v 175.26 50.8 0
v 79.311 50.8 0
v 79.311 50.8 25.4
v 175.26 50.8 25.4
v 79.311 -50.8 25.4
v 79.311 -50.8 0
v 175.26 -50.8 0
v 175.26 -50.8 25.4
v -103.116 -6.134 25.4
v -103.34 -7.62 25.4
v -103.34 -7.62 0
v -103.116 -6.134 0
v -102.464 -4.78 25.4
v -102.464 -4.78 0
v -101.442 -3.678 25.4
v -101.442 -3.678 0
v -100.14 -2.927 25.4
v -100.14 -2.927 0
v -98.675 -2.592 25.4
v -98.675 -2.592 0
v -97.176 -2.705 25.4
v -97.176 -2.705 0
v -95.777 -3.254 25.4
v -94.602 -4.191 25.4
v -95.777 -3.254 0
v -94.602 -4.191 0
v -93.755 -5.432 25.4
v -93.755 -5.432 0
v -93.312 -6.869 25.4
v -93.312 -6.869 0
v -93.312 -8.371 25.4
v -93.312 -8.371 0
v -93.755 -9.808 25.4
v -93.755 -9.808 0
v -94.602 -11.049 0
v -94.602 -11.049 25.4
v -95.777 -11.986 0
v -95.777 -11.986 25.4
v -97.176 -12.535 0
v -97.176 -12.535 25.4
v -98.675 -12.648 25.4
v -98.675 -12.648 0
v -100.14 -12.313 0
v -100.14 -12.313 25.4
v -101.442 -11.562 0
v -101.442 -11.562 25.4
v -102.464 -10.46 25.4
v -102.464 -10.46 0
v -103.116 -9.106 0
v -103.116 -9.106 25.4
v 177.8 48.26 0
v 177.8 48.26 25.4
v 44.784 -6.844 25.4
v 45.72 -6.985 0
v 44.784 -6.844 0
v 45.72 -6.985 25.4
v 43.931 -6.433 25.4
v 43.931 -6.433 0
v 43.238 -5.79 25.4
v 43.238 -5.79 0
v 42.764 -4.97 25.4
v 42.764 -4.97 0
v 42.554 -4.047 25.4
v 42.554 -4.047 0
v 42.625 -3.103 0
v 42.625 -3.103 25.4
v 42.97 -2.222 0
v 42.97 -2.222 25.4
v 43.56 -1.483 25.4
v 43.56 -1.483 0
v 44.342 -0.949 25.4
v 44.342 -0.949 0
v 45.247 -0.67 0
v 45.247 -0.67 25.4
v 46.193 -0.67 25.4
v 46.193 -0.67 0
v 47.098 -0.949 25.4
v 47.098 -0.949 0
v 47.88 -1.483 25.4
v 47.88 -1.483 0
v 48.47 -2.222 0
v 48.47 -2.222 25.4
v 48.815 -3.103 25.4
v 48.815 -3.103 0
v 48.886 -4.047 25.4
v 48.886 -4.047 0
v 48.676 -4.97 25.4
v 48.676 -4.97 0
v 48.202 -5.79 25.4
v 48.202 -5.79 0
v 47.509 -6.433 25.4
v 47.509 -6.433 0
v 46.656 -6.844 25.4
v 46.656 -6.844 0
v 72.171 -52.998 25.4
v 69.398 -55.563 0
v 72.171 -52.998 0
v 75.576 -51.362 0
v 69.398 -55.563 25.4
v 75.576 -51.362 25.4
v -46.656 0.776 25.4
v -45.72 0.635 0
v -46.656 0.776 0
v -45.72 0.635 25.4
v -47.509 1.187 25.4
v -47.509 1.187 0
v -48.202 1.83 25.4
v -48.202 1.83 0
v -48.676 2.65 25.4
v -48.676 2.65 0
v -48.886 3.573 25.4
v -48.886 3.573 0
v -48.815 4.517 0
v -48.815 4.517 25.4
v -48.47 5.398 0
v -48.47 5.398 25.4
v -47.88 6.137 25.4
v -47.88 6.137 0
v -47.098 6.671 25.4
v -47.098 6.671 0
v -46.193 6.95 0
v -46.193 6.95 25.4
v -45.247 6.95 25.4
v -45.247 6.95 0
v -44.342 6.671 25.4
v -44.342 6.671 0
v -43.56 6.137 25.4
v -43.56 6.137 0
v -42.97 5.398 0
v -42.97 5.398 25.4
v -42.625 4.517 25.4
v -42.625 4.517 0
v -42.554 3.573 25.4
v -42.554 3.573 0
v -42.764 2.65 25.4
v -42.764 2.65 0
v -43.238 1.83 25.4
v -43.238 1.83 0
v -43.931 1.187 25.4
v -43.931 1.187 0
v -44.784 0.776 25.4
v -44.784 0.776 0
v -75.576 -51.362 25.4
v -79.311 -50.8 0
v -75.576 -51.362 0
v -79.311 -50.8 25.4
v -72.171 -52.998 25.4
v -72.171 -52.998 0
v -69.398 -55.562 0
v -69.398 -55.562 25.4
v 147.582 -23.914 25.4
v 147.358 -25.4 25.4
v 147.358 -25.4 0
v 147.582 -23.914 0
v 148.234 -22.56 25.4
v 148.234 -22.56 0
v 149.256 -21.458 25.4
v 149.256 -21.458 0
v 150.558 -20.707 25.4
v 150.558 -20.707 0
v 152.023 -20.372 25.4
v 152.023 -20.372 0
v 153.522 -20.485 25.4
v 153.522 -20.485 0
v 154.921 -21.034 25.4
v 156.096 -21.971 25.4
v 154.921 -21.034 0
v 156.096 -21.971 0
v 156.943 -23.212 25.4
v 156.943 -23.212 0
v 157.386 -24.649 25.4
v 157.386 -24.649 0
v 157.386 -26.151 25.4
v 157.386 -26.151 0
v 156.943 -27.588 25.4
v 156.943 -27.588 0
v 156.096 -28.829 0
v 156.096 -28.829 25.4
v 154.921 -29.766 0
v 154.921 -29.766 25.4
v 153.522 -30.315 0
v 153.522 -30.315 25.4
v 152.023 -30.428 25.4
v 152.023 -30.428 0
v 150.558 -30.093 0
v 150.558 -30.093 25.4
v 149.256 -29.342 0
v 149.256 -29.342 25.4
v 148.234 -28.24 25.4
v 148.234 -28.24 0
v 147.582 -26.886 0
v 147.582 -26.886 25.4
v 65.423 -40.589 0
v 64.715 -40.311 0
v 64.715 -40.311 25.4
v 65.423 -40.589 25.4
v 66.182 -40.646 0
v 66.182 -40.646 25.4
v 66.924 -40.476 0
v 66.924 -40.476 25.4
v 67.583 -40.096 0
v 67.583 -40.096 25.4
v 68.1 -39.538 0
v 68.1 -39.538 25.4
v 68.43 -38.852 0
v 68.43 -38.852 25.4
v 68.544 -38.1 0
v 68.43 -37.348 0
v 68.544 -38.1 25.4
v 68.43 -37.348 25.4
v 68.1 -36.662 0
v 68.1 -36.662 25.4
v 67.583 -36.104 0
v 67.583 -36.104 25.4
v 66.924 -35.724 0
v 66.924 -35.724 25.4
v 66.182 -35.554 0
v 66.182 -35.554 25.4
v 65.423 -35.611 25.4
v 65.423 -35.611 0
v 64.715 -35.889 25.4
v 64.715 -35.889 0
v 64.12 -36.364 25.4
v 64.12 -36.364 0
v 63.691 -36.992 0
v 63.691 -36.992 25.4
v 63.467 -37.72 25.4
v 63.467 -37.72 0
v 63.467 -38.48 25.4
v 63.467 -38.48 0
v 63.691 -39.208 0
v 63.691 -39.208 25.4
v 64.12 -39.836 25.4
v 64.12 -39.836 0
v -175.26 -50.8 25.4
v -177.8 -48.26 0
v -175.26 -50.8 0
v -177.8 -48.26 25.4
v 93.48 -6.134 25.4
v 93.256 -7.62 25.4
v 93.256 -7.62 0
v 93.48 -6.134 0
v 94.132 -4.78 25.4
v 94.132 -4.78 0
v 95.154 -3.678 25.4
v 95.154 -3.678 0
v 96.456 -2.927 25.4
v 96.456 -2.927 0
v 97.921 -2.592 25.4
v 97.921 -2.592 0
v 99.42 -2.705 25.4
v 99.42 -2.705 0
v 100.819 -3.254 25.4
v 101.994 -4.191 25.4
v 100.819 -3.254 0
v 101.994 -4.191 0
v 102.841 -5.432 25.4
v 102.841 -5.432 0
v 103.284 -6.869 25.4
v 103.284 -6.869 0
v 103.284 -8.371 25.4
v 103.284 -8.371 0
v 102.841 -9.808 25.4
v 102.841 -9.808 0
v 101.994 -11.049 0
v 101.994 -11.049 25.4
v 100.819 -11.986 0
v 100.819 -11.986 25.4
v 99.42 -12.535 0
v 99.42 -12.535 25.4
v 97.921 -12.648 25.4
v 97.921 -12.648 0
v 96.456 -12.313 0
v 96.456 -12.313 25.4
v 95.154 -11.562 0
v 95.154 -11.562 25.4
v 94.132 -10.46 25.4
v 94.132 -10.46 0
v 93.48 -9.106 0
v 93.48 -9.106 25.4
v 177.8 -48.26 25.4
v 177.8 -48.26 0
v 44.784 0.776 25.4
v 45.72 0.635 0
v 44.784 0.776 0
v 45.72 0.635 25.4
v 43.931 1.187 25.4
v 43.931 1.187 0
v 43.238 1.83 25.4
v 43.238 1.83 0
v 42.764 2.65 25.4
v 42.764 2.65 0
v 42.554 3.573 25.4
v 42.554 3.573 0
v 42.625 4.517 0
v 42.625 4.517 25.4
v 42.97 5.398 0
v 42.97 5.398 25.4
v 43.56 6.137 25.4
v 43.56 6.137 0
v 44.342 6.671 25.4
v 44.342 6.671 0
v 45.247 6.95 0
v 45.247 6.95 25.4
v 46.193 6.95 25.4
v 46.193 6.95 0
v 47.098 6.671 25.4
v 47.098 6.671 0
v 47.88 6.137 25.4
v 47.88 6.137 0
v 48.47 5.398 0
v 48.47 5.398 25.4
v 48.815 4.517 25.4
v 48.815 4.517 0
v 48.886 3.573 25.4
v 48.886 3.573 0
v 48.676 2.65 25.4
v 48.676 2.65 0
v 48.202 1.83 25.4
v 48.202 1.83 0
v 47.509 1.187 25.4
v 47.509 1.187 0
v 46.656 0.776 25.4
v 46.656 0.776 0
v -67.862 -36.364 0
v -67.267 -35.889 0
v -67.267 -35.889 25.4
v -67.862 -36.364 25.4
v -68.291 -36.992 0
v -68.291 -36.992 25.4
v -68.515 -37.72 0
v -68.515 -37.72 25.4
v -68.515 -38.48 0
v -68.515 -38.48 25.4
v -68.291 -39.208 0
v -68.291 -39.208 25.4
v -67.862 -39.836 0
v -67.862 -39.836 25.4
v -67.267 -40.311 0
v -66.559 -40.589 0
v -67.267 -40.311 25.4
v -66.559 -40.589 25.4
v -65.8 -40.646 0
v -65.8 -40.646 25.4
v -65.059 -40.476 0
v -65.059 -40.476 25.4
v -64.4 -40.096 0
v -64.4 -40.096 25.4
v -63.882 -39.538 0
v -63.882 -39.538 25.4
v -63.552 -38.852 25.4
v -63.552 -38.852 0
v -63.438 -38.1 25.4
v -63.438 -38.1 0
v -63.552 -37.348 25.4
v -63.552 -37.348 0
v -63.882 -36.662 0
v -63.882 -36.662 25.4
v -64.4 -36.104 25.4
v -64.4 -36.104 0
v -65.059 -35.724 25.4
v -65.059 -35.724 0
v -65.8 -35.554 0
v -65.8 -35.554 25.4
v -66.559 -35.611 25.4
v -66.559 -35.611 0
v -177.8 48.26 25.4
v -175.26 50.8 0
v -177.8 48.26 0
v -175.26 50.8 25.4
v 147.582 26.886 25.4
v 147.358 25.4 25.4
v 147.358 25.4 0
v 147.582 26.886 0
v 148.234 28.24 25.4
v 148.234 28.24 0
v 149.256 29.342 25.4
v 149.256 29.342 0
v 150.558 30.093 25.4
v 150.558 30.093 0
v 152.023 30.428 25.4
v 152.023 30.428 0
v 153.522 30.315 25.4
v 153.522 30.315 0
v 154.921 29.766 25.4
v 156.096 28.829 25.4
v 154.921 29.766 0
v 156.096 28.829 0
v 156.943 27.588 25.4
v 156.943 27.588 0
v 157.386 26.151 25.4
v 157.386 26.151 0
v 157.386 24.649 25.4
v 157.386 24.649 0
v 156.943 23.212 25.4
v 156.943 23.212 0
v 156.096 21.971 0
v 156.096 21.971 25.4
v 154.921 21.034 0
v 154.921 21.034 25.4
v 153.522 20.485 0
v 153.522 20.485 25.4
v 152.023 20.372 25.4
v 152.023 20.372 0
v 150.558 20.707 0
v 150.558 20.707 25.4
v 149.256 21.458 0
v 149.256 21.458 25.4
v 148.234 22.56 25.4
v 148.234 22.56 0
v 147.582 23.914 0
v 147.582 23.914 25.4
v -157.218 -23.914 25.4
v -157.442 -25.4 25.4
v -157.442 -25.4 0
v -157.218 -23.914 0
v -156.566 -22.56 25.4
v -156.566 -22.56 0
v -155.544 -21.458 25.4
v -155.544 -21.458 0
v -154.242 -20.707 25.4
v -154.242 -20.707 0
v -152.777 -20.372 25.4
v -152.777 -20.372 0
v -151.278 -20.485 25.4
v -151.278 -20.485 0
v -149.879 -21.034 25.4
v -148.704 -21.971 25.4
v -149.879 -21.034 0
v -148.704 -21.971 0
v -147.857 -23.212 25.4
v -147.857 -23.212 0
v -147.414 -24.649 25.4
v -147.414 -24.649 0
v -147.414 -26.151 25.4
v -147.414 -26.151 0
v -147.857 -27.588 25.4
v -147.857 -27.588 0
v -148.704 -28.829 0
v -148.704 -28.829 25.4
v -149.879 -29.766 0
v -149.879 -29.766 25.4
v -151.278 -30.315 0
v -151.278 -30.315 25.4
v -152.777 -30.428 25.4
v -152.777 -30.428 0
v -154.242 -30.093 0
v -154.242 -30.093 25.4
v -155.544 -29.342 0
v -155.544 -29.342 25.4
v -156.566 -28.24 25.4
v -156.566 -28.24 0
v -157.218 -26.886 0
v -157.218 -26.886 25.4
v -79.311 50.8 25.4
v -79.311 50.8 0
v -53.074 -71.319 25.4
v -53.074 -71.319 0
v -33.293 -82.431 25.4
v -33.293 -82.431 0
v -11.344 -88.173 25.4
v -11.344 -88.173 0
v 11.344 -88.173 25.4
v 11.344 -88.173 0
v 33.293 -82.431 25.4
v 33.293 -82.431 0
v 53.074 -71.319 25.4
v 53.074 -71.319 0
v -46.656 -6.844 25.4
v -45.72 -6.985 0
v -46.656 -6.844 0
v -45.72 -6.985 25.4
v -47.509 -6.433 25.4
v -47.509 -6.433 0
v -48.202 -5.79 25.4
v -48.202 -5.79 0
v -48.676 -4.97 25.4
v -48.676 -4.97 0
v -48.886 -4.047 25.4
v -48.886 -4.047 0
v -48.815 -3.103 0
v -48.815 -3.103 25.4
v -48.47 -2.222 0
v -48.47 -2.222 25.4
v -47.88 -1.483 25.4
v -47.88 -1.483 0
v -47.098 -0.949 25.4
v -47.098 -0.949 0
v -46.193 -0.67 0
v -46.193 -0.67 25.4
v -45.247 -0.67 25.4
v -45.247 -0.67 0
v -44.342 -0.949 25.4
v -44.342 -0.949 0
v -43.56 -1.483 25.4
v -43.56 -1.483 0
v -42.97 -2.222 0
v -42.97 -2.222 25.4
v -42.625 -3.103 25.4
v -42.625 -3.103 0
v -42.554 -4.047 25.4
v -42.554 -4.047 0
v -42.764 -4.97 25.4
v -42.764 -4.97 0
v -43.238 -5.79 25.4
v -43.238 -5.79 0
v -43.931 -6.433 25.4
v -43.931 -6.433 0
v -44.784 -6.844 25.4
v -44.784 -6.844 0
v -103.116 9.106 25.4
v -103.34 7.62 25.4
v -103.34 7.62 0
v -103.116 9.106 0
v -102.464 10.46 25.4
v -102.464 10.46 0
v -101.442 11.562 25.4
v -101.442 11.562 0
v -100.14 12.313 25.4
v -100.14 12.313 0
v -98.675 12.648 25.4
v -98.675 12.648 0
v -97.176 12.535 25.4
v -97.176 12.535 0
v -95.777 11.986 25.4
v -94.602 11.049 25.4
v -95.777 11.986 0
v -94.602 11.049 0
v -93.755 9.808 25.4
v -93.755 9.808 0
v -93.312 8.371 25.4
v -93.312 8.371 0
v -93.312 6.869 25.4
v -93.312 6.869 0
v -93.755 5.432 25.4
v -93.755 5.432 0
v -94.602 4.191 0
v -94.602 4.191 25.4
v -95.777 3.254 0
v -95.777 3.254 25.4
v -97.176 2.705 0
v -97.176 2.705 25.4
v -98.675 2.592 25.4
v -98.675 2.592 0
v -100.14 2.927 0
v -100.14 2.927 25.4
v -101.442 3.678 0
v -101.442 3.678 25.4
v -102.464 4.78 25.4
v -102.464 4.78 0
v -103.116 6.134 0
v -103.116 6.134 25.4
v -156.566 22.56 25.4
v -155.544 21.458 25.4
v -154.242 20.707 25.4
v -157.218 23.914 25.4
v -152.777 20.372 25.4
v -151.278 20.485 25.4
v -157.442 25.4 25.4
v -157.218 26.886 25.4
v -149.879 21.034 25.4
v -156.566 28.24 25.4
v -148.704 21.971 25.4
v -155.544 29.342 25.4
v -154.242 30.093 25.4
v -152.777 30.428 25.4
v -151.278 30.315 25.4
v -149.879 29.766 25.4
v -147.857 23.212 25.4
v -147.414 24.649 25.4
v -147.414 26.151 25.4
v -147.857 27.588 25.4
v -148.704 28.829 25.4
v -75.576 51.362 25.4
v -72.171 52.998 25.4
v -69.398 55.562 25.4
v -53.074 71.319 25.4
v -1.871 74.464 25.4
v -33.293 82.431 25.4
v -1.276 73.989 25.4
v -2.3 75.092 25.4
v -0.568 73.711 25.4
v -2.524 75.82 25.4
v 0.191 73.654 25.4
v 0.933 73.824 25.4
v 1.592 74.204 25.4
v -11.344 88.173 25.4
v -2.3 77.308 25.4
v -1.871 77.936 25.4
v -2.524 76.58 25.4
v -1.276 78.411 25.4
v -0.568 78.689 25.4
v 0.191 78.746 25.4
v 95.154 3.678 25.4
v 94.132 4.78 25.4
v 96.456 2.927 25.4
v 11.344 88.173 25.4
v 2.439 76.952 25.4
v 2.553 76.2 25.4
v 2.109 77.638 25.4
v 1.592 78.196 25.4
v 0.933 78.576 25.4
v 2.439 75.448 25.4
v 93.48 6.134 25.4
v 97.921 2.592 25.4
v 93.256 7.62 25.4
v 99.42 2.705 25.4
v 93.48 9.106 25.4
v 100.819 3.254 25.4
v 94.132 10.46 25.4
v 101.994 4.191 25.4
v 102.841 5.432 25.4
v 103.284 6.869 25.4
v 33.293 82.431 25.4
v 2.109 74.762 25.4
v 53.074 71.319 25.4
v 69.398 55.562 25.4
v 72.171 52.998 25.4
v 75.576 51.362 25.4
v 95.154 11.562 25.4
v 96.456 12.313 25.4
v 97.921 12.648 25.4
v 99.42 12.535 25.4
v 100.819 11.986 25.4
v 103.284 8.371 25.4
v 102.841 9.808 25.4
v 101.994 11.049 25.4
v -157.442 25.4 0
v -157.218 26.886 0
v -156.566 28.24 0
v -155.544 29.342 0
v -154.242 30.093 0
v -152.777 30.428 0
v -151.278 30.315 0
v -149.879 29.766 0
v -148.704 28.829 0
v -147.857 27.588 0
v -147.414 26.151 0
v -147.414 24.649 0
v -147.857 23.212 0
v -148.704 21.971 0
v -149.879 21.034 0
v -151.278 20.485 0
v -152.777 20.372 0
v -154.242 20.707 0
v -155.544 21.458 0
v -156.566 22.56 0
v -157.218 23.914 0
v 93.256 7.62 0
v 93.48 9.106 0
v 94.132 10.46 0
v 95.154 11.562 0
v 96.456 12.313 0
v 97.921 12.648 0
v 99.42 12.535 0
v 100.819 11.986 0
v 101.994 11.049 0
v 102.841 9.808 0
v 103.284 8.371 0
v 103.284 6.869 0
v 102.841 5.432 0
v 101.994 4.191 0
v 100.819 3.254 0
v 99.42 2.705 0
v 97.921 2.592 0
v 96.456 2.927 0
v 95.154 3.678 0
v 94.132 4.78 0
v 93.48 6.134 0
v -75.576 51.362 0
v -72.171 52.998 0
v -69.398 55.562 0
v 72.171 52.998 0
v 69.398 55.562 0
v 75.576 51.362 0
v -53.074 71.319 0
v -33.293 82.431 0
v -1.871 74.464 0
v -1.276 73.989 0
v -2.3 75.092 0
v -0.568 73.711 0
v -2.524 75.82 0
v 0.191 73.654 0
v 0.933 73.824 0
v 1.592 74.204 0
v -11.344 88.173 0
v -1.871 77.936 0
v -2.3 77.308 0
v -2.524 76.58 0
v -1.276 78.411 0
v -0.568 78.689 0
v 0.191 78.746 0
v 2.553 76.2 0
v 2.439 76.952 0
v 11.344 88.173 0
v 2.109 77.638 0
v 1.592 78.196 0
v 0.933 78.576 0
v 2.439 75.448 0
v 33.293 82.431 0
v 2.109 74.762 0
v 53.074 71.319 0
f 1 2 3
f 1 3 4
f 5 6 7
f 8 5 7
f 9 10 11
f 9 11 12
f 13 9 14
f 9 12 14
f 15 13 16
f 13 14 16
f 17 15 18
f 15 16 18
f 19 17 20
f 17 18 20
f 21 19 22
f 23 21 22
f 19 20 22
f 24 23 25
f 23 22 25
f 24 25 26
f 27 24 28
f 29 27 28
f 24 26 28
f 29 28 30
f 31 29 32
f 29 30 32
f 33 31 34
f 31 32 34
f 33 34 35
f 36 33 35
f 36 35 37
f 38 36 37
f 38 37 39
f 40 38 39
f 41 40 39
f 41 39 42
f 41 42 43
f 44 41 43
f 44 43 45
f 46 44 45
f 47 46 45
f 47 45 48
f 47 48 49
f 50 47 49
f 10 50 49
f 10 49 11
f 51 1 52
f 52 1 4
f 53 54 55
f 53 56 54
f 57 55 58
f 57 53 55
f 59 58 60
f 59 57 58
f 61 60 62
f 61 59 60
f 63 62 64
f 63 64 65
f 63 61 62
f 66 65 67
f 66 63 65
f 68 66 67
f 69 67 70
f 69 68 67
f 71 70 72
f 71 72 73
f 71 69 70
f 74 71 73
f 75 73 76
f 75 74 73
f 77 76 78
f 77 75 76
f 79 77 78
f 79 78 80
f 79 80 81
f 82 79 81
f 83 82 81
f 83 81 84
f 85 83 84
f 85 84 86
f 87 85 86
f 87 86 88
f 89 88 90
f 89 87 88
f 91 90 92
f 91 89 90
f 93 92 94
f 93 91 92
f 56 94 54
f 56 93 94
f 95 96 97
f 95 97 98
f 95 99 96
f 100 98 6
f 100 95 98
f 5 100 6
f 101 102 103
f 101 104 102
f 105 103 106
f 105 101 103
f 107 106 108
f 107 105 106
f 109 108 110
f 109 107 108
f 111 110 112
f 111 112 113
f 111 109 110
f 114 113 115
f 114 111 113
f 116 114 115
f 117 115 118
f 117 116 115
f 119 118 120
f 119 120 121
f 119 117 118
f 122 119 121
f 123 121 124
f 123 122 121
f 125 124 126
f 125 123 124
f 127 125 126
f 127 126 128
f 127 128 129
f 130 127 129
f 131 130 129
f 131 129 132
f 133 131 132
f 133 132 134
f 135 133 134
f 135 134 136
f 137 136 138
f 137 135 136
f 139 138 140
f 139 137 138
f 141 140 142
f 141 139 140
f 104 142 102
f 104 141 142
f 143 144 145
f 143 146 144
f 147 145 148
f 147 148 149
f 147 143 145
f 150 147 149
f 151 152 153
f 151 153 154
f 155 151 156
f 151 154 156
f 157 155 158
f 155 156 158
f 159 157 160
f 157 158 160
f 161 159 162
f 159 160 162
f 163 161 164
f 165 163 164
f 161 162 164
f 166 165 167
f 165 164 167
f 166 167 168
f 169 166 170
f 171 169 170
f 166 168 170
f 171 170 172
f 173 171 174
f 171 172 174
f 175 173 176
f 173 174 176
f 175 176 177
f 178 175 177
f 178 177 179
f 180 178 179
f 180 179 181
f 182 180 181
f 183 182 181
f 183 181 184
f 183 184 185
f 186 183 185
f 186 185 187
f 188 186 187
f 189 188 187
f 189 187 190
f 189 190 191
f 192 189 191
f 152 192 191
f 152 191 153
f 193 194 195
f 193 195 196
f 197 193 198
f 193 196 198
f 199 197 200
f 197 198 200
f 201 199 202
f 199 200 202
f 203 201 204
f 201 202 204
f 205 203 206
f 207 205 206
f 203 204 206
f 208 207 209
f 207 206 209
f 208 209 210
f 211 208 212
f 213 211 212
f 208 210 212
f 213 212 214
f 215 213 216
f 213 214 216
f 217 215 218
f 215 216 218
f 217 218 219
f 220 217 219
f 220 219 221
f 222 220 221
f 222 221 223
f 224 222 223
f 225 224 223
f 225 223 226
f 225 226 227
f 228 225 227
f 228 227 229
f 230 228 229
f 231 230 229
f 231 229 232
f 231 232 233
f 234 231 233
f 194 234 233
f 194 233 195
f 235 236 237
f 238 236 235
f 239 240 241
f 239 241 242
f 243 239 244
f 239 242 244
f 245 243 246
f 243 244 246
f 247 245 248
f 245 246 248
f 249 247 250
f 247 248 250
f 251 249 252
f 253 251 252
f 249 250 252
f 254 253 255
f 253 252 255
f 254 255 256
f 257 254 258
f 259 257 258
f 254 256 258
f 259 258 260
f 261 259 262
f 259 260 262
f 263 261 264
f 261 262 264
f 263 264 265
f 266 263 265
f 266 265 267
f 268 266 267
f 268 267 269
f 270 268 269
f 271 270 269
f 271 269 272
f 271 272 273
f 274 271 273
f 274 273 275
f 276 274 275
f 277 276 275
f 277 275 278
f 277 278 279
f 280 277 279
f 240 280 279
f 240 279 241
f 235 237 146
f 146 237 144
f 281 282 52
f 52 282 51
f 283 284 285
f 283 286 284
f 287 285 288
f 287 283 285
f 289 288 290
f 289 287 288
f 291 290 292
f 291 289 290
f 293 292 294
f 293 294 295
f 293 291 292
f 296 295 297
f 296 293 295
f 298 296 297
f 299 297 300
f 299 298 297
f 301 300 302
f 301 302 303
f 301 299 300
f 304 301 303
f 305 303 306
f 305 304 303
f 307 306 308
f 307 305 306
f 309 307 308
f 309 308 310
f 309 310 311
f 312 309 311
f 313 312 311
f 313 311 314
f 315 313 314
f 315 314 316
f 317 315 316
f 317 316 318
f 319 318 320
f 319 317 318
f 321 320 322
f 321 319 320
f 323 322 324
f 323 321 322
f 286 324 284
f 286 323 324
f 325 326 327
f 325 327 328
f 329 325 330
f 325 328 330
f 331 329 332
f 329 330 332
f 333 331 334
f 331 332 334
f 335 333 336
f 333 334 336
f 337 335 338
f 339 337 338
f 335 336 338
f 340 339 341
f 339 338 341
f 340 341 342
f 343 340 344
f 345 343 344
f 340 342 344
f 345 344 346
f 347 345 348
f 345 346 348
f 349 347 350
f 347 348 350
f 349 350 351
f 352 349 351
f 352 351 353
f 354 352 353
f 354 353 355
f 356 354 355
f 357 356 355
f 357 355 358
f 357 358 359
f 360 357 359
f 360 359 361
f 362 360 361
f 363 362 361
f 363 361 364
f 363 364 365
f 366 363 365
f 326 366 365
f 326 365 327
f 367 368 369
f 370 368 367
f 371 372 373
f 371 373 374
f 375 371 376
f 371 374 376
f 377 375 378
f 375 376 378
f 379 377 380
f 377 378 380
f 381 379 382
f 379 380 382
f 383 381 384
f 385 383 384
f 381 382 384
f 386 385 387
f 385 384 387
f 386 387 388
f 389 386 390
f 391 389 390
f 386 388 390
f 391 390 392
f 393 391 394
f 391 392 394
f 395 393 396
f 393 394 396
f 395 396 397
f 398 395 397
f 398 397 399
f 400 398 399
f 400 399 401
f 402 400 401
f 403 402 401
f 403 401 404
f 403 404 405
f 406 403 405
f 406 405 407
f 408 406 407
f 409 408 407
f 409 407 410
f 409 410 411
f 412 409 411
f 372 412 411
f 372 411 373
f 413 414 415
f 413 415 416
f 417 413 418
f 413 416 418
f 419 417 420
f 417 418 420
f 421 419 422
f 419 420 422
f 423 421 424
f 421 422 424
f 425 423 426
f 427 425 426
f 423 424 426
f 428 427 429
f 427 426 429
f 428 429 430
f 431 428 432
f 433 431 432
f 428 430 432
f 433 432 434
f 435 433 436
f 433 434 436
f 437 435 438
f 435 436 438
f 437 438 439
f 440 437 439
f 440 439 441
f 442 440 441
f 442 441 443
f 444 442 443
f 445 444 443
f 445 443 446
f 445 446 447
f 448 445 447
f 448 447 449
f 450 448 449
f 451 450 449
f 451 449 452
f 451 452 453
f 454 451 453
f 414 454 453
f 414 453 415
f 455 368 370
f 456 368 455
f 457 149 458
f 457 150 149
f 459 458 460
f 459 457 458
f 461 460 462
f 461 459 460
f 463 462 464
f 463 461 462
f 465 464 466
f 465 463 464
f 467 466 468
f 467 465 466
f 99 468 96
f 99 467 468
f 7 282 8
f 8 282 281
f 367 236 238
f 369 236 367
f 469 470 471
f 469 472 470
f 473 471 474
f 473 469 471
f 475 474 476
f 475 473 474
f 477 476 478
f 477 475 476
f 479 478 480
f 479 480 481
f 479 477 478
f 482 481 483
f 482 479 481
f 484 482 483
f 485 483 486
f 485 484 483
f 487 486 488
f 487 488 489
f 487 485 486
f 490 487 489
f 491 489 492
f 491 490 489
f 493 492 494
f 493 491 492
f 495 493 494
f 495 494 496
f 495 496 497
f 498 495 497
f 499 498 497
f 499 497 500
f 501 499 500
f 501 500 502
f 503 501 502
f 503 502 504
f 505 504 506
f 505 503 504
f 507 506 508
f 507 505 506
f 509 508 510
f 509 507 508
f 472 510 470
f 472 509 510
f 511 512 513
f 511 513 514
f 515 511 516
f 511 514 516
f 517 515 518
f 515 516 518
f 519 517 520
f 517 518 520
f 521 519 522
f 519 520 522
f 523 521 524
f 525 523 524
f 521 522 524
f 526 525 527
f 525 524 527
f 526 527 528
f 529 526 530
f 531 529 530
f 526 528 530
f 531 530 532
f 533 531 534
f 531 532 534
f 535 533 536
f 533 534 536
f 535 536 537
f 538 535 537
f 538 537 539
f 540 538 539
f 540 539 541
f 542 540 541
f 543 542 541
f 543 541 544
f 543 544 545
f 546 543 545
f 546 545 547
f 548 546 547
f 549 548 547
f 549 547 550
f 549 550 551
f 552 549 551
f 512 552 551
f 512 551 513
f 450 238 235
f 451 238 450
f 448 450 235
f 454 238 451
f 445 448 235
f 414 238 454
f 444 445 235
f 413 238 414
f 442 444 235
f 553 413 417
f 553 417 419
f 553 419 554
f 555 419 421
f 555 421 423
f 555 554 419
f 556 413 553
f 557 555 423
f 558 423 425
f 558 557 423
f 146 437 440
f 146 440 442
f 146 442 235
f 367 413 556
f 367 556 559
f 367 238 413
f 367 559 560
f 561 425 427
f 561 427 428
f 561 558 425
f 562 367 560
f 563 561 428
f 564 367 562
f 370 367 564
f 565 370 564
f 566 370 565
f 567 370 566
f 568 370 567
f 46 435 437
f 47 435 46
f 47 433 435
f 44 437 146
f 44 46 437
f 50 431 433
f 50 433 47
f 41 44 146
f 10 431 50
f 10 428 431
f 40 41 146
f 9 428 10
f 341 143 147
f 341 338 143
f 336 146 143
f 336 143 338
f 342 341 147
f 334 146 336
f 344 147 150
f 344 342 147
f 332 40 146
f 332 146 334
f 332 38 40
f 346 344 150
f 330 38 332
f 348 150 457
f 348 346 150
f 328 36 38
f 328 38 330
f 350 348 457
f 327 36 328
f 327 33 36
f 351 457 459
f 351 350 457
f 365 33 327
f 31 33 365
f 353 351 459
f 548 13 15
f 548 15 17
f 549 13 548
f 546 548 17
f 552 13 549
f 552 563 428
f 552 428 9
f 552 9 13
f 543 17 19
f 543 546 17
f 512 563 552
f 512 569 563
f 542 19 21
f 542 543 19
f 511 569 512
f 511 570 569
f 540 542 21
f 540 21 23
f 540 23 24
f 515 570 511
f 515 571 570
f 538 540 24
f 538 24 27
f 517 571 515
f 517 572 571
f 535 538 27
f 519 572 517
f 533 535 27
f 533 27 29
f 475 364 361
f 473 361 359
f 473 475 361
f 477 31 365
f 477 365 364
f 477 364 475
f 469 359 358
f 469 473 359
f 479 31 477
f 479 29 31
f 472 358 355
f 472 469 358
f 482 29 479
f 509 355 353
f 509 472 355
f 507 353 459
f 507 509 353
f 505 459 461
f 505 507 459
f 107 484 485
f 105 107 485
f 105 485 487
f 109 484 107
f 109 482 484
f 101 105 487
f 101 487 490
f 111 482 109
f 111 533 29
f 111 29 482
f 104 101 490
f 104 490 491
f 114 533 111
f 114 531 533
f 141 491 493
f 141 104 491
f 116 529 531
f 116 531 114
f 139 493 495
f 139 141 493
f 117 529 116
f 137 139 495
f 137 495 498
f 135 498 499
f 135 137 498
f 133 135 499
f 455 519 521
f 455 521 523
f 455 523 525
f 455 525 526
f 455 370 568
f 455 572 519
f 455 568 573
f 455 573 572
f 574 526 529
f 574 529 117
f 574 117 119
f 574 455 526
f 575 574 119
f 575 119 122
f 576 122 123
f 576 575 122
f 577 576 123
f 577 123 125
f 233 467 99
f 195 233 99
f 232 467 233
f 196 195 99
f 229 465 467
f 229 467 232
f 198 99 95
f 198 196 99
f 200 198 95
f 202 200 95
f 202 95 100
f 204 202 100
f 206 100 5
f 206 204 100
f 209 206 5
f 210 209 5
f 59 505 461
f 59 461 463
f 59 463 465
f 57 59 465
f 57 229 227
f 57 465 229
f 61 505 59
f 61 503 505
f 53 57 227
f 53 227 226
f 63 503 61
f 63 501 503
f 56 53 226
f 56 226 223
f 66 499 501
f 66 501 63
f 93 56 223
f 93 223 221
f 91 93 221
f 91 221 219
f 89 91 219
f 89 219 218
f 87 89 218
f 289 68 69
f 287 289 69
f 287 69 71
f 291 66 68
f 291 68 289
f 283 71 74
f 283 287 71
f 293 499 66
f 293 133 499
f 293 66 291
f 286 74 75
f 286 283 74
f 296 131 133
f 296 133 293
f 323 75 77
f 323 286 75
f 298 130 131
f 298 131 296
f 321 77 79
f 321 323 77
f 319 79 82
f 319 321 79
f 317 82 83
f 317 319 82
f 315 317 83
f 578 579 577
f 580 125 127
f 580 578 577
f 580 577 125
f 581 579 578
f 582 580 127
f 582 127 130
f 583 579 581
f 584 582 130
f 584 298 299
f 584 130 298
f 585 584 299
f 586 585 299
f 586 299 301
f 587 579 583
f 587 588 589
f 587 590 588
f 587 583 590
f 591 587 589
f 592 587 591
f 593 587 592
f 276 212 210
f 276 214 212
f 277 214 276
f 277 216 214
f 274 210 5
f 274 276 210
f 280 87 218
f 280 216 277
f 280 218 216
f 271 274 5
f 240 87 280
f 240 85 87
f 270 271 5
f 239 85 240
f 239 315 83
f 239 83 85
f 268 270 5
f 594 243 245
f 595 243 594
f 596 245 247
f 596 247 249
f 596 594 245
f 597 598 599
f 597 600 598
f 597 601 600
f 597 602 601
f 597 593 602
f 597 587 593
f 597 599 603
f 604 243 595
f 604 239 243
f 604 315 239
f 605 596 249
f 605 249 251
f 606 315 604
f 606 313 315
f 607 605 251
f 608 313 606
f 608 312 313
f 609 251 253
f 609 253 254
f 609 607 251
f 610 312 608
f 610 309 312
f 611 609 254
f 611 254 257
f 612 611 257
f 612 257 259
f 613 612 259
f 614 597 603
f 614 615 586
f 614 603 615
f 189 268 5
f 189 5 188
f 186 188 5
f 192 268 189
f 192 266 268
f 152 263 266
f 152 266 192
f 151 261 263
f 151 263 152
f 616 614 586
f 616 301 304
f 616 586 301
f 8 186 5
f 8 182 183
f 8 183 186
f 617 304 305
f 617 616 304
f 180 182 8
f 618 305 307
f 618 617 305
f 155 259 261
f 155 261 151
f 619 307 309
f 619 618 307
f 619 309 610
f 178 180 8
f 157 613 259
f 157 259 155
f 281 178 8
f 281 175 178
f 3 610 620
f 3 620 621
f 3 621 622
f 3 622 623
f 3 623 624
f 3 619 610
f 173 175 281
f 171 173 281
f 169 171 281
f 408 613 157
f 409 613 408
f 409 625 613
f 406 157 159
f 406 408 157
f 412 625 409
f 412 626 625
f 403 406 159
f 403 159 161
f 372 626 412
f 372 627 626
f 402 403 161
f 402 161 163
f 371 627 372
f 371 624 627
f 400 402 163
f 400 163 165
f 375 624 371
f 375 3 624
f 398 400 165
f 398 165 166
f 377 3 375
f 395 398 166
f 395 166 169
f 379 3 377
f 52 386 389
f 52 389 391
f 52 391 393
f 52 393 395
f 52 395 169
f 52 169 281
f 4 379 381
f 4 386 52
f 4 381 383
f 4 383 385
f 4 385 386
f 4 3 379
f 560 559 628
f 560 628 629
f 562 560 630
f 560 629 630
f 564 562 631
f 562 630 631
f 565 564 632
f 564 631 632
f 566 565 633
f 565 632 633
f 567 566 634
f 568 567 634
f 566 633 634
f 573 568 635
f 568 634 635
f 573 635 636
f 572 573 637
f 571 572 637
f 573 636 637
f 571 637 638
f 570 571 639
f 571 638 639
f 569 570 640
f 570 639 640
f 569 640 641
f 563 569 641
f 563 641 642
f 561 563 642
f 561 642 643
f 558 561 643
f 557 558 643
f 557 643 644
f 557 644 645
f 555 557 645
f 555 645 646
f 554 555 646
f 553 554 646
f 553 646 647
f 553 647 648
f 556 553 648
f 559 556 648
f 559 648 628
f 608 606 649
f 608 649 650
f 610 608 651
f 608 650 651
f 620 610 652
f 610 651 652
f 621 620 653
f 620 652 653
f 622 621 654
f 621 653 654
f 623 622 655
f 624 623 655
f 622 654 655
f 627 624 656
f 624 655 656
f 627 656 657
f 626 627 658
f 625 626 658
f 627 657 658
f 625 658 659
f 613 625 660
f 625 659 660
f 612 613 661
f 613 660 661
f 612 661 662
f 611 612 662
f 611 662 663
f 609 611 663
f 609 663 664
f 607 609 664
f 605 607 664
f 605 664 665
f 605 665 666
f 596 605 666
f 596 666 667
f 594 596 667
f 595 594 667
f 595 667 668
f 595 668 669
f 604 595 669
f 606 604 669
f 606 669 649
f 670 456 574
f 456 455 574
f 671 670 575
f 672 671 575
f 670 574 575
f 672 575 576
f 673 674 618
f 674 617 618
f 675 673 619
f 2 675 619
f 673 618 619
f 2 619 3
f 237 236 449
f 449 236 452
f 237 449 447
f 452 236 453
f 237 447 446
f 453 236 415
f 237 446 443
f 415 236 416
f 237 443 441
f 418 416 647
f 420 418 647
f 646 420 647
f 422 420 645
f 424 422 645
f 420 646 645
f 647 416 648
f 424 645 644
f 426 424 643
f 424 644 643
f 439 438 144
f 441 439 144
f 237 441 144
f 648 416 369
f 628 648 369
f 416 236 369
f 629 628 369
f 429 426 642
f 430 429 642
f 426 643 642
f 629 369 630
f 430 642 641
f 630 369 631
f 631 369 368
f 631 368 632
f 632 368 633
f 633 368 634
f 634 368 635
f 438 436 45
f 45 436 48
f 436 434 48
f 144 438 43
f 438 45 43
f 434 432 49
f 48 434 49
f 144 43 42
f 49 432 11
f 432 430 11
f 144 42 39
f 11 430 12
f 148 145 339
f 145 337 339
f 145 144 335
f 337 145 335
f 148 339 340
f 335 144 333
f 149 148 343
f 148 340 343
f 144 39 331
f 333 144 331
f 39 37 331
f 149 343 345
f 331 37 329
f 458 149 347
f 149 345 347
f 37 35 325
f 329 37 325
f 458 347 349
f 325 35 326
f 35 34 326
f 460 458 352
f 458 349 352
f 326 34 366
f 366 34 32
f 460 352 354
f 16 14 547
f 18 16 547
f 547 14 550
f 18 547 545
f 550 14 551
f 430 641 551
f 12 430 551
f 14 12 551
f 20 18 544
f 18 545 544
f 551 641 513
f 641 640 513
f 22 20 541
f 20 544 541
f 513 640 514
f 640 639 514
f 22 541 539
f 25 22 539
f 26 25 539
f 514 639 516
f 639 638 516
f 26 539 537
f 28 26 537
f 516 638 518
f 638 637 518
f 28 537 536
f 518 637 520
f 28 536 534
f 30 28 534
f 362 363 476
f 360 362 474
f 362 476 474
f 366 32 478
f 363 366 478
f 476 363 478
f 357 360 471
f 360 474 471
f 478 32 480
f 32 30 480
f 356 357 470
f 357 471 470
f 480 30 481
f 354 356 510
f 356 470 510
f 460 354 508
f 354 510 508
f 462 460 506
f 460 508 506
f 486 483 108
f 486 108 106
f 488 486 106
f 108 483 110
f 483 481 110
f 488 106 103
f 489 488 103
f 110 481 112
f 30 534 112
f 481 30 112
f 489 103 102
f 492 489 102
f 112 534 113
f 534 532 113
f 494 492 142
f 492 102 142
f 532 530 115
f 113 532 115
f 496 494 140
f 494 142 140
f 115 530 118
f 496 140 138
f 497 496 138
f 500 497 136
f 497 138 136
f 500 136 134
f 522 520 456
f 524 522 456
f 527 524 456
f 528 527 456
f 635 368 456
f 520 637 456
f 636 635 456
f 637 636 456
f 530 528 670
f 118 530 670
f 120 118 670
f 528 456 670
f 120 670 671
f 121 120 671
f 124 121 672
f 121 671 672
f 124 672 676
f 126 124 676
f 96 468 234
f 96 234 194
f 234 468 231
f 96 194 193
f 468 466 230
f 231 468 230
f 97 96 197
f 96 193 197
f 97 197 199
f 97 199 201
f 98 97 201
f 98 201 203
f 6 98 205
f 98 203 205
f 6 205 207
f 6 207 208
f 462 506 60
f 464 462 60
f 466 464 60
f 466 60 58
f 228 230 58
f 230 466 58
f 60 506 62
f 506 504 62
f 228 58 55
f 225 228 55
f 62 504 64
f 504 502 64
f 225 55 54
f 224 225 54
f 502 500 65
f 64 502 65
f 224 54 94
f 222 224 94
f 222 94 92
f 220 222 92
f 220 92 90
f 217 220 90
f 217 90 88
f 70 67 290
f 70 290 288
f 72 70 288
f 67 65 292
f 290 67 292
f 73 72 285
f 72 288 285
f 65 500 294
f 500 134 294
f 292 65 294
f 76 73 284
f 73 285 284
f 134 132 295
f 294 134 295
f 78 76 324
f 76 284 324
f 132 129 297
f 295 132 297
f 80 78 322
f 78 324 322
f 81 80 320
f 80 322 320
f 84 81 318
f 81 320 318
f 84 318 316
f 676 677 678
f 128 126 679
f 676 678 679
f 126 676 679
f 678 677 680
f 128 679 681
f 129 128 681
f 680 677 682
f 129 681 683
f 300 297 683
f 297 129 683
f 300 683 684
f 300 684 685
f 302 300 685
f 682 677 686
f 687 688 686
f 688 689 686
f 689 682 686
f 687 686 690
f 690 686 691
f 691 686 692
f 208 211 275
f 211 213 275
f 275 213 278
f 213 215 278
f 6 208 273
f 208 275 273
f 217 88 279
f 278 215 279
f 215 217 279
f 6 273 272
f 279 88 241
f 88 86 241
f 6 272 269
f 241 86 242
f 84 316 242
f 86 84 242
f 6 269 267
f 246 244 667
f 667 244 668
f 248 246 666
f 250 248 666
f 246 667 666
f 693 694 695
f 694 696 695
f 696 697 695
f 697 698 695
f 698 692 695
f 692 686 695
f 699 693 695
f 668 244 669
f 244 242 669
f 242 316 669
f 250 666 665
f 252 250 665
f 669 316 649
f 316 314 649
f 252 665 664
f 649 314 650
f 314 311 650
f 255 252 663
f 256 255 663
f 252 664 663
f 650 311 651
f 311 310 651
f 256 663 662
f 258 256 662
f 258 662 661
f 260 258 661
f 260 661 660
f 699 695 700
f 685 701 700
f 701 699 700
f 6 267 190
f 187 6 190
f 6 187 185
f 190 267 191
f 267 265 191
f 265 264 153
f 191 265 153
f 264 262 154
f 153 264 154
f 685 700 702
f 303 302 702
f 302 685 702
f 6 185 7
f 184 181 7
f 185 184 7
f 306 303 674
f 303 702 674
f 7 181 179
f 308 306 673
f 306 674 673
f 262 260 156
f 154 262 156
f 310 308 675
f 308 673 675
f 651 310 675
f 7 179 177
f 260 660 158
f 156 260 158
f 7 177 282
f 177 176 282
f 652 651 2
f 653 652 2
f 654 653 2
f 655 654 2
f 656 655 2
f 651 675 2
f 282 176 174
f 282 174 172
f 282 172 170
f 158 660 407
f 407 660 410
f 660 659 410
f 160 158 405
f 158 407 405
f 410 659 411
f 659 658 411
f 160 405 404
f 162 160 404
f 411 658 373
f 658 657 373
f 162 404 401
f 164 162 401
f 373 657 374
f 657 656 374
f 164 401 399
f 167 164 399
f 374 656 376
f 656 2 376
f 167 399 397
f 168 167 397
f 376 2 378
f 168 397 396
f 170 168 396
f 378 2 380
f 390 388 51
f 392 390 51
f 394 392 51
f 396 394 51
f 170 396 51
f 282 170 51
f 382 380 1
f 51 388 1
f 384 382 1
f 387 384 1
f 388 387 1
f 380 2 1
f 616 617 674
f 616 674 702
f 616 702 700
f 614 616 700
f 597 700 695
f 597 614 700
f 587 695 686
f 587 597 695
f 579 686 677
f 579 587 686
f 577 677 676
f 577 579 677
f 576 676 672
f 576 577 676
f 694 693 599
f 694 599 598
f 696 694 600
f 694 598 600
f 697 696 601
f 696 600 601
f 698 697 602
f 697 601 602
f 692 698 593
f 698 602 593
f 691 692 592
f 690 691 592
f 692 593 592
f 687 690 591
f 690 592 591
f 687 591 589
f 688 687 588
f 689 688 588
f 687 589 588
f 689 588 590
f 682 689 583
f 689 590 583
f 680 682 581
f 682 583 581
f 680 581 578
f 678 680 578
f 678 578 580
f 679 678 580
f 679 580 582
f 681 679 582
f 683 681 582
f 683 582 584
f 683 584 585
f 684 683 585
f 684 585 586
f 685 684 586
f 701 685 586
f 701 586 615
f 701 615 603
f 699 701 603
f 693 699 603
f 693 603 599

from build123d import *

# Parameters (mm, degrees)
SKETCH1_W               = 355.6
SKETCH1_H               = 101.6
EXTRUDE1_DEPTH          = 25.4
SKETCH10_R              = 88.9
EXTRUDE2_DEPTH          = 25.4
F_10_CLEARANCE_HOLE1_D  = 5.1054
CIRPATTERN1_COUNT       = 3
F_3_8_CLEARANCE_HOLE2_D = 10.0838
LPATTERN1_COUNT         = 2
LPATTERN1_PITCH         = 15.24
LPATTERN1_COUNT_DIR2    = 2
LPATTERN1_PITCH_DIR2    = 196.596
F_3_8_CLEARANCE_HOLE1_D = 10.0838
LPATTERN2_COUNT         = 2
LPATTERN2_PITCH         = 304.8
LPATTERN2_COUNT_DIR2    = 2
LPATTERN2_PITCH_DIR2    = 50.8
LPATTERN3_COUNT         = 2
LPATTERN3_PITCH         = 7.62
LPATTERN3_COUNT_DIR2    = 2
LPATTERN3_PITCH_DIR2    = 91.44
FILLET2_R               = 12.7
CHAMFER1_SIZE           = 2.54


with BuildPart() as part:
    # Sketch1 → Extrude1 (new body)
    with BuildSketch(Plane.XY):
        Rectangle(SKETCH1_W, SKETCH1_H)
    extrude(amount=EXTRUDE1_DEPTH)

    # Sketch10 → Extrude2 (add)
    with BuildSketch(Plane.XY.offset(25.4)):
        Circle(SKETCH10_R)
    extrude(amount=-EXTRUDE2_DEPTH)

    # 10 Clearance Hole1 (through all)
    with Locations(Plane(origin=(0, 0, 0), x_dir=(-1, 0, 0), z_dir=(0, 0, -1))):
        with Locations((0, 76.2)):
            f_10_clearance_hole1 = Hole(F_10_CLEARANCE_HOLE1_D / 2)

    # CirPattern1: 10 Clearance Hole1 ×3 about axis
    cirpattern1_axis = Axis((0, 0, 0), (0, 0, 1))
    for i in range(1, CIRPATTERN1_COUNT):
        add(f_10_clearance_hole1.rotate(cirpattern1_axis, i * 360 / CIRPATTERN1_COUNT), mode=Mode.SUBTRACT)

    # 3_8 Clearance Hole2 (through all)
    with Locations(Plane.XY.offset(25.4)):
        with Locations((98.298, 7.62)):
            f_3_8_clearance_hole2 = Hole(F_3_8_CLEARANCE_HOLE2_D / 2)

    # LPattern1: 3_8 Clearance Hole2 2 × 2
    with Locations(*[(-j * LPATTERN1_PITCH_DIR2, -i * LPATTERN1_PITCH, 0) for i in range(LPATTERN1_COUNT) for j in range(LPATTERN1_COUNT_DIR2) if (i, j) != (0, 0)]):
        add(f_3_8_clearance_hole2, mode=Mode.SUBTRACT)

    # 3_8 Clearance Hole1 (through all)
    with Locations(Plane.XY.offset(25.4)):
        with Locations((-152.4, 25.4)):
            f_3_8_clearance_hole1 = Hole(F_3_8_CLEARANCE_HOLE1_D / 2)

    # LPattern2: 3_8 Clearance Hole1 2 × 2
    with Locations(*[(i * LPATTERN2_PITCH, -j * LPATTERN2_PITCH_DIR2, 0) for i in range(LPATTERN2_COUNT) for j in range(LPATTERN2_COUNT_DIR2) if (i, j) != (0, 0)]):
        add(f_3_8_clearance_hole1, mode=Mode.SUBTRACT)

    # Sketch8 → 1_4 _0.25_ Diameter Hole1 (revolve, cut)
    with BuildSketch(Plane(origin=(45.72, 3.81, 25.4), x_dir=(0, -1, 0), z_dir=(1, 0, 0))):
        Polygon((0, 0), (0, 27.307732465), (3.175, 25.4), (3.175, 0), align=None)
    f_1_4_0_25_diameter_hole1 = revolve(axis=Axis((45.72, 3.81, 31.75), (0, 0, -1)), mode=Mode.SUBTRACT)

    # LPattern3: 1_4 _0.25_ Diameter Hole1 2 × 2
    with Locations(*[(-j * LPATTERN3_PITCH_DIR2, -i * LPATTERN3_PITCH, 0) for i in range(LPATTERN3_COUNT) for j in range(LPATTERN3_COUNT_DIR2) if (i, j) != (0, 0)]):
        add(f_1_4_0_25_diameter_hole1, mode=Mode.SUBTRACT)

    # Fillet2
    fillet2_edges = [part.edges().sort_by_distance(p)[0] for p in [
        (72.955945611, 50.8, 12.7),
        (72.955945611, -50.8, 12.7),
        (-72.955945611, 50.8, 12.7),
        (-72.955945611, -50.8, 12.7),
    ]]
    fillet(fillet2_edges, radius=FILLET2_R)

    # Chamfer1
    chamfer1_edges = [part.edges().sort_by_distance(p)[0] for p in [
        (177.8, -50.8, 12.7),
        (-177.8, -50.8, 12.7),
        (-177.8, 50.8, 12.7),
        (177.8, 50.8, 12.7),
    ]]
    chamfer(chamfer1_edges, length=CHAMFER1_SIZE)


solid = part.part
